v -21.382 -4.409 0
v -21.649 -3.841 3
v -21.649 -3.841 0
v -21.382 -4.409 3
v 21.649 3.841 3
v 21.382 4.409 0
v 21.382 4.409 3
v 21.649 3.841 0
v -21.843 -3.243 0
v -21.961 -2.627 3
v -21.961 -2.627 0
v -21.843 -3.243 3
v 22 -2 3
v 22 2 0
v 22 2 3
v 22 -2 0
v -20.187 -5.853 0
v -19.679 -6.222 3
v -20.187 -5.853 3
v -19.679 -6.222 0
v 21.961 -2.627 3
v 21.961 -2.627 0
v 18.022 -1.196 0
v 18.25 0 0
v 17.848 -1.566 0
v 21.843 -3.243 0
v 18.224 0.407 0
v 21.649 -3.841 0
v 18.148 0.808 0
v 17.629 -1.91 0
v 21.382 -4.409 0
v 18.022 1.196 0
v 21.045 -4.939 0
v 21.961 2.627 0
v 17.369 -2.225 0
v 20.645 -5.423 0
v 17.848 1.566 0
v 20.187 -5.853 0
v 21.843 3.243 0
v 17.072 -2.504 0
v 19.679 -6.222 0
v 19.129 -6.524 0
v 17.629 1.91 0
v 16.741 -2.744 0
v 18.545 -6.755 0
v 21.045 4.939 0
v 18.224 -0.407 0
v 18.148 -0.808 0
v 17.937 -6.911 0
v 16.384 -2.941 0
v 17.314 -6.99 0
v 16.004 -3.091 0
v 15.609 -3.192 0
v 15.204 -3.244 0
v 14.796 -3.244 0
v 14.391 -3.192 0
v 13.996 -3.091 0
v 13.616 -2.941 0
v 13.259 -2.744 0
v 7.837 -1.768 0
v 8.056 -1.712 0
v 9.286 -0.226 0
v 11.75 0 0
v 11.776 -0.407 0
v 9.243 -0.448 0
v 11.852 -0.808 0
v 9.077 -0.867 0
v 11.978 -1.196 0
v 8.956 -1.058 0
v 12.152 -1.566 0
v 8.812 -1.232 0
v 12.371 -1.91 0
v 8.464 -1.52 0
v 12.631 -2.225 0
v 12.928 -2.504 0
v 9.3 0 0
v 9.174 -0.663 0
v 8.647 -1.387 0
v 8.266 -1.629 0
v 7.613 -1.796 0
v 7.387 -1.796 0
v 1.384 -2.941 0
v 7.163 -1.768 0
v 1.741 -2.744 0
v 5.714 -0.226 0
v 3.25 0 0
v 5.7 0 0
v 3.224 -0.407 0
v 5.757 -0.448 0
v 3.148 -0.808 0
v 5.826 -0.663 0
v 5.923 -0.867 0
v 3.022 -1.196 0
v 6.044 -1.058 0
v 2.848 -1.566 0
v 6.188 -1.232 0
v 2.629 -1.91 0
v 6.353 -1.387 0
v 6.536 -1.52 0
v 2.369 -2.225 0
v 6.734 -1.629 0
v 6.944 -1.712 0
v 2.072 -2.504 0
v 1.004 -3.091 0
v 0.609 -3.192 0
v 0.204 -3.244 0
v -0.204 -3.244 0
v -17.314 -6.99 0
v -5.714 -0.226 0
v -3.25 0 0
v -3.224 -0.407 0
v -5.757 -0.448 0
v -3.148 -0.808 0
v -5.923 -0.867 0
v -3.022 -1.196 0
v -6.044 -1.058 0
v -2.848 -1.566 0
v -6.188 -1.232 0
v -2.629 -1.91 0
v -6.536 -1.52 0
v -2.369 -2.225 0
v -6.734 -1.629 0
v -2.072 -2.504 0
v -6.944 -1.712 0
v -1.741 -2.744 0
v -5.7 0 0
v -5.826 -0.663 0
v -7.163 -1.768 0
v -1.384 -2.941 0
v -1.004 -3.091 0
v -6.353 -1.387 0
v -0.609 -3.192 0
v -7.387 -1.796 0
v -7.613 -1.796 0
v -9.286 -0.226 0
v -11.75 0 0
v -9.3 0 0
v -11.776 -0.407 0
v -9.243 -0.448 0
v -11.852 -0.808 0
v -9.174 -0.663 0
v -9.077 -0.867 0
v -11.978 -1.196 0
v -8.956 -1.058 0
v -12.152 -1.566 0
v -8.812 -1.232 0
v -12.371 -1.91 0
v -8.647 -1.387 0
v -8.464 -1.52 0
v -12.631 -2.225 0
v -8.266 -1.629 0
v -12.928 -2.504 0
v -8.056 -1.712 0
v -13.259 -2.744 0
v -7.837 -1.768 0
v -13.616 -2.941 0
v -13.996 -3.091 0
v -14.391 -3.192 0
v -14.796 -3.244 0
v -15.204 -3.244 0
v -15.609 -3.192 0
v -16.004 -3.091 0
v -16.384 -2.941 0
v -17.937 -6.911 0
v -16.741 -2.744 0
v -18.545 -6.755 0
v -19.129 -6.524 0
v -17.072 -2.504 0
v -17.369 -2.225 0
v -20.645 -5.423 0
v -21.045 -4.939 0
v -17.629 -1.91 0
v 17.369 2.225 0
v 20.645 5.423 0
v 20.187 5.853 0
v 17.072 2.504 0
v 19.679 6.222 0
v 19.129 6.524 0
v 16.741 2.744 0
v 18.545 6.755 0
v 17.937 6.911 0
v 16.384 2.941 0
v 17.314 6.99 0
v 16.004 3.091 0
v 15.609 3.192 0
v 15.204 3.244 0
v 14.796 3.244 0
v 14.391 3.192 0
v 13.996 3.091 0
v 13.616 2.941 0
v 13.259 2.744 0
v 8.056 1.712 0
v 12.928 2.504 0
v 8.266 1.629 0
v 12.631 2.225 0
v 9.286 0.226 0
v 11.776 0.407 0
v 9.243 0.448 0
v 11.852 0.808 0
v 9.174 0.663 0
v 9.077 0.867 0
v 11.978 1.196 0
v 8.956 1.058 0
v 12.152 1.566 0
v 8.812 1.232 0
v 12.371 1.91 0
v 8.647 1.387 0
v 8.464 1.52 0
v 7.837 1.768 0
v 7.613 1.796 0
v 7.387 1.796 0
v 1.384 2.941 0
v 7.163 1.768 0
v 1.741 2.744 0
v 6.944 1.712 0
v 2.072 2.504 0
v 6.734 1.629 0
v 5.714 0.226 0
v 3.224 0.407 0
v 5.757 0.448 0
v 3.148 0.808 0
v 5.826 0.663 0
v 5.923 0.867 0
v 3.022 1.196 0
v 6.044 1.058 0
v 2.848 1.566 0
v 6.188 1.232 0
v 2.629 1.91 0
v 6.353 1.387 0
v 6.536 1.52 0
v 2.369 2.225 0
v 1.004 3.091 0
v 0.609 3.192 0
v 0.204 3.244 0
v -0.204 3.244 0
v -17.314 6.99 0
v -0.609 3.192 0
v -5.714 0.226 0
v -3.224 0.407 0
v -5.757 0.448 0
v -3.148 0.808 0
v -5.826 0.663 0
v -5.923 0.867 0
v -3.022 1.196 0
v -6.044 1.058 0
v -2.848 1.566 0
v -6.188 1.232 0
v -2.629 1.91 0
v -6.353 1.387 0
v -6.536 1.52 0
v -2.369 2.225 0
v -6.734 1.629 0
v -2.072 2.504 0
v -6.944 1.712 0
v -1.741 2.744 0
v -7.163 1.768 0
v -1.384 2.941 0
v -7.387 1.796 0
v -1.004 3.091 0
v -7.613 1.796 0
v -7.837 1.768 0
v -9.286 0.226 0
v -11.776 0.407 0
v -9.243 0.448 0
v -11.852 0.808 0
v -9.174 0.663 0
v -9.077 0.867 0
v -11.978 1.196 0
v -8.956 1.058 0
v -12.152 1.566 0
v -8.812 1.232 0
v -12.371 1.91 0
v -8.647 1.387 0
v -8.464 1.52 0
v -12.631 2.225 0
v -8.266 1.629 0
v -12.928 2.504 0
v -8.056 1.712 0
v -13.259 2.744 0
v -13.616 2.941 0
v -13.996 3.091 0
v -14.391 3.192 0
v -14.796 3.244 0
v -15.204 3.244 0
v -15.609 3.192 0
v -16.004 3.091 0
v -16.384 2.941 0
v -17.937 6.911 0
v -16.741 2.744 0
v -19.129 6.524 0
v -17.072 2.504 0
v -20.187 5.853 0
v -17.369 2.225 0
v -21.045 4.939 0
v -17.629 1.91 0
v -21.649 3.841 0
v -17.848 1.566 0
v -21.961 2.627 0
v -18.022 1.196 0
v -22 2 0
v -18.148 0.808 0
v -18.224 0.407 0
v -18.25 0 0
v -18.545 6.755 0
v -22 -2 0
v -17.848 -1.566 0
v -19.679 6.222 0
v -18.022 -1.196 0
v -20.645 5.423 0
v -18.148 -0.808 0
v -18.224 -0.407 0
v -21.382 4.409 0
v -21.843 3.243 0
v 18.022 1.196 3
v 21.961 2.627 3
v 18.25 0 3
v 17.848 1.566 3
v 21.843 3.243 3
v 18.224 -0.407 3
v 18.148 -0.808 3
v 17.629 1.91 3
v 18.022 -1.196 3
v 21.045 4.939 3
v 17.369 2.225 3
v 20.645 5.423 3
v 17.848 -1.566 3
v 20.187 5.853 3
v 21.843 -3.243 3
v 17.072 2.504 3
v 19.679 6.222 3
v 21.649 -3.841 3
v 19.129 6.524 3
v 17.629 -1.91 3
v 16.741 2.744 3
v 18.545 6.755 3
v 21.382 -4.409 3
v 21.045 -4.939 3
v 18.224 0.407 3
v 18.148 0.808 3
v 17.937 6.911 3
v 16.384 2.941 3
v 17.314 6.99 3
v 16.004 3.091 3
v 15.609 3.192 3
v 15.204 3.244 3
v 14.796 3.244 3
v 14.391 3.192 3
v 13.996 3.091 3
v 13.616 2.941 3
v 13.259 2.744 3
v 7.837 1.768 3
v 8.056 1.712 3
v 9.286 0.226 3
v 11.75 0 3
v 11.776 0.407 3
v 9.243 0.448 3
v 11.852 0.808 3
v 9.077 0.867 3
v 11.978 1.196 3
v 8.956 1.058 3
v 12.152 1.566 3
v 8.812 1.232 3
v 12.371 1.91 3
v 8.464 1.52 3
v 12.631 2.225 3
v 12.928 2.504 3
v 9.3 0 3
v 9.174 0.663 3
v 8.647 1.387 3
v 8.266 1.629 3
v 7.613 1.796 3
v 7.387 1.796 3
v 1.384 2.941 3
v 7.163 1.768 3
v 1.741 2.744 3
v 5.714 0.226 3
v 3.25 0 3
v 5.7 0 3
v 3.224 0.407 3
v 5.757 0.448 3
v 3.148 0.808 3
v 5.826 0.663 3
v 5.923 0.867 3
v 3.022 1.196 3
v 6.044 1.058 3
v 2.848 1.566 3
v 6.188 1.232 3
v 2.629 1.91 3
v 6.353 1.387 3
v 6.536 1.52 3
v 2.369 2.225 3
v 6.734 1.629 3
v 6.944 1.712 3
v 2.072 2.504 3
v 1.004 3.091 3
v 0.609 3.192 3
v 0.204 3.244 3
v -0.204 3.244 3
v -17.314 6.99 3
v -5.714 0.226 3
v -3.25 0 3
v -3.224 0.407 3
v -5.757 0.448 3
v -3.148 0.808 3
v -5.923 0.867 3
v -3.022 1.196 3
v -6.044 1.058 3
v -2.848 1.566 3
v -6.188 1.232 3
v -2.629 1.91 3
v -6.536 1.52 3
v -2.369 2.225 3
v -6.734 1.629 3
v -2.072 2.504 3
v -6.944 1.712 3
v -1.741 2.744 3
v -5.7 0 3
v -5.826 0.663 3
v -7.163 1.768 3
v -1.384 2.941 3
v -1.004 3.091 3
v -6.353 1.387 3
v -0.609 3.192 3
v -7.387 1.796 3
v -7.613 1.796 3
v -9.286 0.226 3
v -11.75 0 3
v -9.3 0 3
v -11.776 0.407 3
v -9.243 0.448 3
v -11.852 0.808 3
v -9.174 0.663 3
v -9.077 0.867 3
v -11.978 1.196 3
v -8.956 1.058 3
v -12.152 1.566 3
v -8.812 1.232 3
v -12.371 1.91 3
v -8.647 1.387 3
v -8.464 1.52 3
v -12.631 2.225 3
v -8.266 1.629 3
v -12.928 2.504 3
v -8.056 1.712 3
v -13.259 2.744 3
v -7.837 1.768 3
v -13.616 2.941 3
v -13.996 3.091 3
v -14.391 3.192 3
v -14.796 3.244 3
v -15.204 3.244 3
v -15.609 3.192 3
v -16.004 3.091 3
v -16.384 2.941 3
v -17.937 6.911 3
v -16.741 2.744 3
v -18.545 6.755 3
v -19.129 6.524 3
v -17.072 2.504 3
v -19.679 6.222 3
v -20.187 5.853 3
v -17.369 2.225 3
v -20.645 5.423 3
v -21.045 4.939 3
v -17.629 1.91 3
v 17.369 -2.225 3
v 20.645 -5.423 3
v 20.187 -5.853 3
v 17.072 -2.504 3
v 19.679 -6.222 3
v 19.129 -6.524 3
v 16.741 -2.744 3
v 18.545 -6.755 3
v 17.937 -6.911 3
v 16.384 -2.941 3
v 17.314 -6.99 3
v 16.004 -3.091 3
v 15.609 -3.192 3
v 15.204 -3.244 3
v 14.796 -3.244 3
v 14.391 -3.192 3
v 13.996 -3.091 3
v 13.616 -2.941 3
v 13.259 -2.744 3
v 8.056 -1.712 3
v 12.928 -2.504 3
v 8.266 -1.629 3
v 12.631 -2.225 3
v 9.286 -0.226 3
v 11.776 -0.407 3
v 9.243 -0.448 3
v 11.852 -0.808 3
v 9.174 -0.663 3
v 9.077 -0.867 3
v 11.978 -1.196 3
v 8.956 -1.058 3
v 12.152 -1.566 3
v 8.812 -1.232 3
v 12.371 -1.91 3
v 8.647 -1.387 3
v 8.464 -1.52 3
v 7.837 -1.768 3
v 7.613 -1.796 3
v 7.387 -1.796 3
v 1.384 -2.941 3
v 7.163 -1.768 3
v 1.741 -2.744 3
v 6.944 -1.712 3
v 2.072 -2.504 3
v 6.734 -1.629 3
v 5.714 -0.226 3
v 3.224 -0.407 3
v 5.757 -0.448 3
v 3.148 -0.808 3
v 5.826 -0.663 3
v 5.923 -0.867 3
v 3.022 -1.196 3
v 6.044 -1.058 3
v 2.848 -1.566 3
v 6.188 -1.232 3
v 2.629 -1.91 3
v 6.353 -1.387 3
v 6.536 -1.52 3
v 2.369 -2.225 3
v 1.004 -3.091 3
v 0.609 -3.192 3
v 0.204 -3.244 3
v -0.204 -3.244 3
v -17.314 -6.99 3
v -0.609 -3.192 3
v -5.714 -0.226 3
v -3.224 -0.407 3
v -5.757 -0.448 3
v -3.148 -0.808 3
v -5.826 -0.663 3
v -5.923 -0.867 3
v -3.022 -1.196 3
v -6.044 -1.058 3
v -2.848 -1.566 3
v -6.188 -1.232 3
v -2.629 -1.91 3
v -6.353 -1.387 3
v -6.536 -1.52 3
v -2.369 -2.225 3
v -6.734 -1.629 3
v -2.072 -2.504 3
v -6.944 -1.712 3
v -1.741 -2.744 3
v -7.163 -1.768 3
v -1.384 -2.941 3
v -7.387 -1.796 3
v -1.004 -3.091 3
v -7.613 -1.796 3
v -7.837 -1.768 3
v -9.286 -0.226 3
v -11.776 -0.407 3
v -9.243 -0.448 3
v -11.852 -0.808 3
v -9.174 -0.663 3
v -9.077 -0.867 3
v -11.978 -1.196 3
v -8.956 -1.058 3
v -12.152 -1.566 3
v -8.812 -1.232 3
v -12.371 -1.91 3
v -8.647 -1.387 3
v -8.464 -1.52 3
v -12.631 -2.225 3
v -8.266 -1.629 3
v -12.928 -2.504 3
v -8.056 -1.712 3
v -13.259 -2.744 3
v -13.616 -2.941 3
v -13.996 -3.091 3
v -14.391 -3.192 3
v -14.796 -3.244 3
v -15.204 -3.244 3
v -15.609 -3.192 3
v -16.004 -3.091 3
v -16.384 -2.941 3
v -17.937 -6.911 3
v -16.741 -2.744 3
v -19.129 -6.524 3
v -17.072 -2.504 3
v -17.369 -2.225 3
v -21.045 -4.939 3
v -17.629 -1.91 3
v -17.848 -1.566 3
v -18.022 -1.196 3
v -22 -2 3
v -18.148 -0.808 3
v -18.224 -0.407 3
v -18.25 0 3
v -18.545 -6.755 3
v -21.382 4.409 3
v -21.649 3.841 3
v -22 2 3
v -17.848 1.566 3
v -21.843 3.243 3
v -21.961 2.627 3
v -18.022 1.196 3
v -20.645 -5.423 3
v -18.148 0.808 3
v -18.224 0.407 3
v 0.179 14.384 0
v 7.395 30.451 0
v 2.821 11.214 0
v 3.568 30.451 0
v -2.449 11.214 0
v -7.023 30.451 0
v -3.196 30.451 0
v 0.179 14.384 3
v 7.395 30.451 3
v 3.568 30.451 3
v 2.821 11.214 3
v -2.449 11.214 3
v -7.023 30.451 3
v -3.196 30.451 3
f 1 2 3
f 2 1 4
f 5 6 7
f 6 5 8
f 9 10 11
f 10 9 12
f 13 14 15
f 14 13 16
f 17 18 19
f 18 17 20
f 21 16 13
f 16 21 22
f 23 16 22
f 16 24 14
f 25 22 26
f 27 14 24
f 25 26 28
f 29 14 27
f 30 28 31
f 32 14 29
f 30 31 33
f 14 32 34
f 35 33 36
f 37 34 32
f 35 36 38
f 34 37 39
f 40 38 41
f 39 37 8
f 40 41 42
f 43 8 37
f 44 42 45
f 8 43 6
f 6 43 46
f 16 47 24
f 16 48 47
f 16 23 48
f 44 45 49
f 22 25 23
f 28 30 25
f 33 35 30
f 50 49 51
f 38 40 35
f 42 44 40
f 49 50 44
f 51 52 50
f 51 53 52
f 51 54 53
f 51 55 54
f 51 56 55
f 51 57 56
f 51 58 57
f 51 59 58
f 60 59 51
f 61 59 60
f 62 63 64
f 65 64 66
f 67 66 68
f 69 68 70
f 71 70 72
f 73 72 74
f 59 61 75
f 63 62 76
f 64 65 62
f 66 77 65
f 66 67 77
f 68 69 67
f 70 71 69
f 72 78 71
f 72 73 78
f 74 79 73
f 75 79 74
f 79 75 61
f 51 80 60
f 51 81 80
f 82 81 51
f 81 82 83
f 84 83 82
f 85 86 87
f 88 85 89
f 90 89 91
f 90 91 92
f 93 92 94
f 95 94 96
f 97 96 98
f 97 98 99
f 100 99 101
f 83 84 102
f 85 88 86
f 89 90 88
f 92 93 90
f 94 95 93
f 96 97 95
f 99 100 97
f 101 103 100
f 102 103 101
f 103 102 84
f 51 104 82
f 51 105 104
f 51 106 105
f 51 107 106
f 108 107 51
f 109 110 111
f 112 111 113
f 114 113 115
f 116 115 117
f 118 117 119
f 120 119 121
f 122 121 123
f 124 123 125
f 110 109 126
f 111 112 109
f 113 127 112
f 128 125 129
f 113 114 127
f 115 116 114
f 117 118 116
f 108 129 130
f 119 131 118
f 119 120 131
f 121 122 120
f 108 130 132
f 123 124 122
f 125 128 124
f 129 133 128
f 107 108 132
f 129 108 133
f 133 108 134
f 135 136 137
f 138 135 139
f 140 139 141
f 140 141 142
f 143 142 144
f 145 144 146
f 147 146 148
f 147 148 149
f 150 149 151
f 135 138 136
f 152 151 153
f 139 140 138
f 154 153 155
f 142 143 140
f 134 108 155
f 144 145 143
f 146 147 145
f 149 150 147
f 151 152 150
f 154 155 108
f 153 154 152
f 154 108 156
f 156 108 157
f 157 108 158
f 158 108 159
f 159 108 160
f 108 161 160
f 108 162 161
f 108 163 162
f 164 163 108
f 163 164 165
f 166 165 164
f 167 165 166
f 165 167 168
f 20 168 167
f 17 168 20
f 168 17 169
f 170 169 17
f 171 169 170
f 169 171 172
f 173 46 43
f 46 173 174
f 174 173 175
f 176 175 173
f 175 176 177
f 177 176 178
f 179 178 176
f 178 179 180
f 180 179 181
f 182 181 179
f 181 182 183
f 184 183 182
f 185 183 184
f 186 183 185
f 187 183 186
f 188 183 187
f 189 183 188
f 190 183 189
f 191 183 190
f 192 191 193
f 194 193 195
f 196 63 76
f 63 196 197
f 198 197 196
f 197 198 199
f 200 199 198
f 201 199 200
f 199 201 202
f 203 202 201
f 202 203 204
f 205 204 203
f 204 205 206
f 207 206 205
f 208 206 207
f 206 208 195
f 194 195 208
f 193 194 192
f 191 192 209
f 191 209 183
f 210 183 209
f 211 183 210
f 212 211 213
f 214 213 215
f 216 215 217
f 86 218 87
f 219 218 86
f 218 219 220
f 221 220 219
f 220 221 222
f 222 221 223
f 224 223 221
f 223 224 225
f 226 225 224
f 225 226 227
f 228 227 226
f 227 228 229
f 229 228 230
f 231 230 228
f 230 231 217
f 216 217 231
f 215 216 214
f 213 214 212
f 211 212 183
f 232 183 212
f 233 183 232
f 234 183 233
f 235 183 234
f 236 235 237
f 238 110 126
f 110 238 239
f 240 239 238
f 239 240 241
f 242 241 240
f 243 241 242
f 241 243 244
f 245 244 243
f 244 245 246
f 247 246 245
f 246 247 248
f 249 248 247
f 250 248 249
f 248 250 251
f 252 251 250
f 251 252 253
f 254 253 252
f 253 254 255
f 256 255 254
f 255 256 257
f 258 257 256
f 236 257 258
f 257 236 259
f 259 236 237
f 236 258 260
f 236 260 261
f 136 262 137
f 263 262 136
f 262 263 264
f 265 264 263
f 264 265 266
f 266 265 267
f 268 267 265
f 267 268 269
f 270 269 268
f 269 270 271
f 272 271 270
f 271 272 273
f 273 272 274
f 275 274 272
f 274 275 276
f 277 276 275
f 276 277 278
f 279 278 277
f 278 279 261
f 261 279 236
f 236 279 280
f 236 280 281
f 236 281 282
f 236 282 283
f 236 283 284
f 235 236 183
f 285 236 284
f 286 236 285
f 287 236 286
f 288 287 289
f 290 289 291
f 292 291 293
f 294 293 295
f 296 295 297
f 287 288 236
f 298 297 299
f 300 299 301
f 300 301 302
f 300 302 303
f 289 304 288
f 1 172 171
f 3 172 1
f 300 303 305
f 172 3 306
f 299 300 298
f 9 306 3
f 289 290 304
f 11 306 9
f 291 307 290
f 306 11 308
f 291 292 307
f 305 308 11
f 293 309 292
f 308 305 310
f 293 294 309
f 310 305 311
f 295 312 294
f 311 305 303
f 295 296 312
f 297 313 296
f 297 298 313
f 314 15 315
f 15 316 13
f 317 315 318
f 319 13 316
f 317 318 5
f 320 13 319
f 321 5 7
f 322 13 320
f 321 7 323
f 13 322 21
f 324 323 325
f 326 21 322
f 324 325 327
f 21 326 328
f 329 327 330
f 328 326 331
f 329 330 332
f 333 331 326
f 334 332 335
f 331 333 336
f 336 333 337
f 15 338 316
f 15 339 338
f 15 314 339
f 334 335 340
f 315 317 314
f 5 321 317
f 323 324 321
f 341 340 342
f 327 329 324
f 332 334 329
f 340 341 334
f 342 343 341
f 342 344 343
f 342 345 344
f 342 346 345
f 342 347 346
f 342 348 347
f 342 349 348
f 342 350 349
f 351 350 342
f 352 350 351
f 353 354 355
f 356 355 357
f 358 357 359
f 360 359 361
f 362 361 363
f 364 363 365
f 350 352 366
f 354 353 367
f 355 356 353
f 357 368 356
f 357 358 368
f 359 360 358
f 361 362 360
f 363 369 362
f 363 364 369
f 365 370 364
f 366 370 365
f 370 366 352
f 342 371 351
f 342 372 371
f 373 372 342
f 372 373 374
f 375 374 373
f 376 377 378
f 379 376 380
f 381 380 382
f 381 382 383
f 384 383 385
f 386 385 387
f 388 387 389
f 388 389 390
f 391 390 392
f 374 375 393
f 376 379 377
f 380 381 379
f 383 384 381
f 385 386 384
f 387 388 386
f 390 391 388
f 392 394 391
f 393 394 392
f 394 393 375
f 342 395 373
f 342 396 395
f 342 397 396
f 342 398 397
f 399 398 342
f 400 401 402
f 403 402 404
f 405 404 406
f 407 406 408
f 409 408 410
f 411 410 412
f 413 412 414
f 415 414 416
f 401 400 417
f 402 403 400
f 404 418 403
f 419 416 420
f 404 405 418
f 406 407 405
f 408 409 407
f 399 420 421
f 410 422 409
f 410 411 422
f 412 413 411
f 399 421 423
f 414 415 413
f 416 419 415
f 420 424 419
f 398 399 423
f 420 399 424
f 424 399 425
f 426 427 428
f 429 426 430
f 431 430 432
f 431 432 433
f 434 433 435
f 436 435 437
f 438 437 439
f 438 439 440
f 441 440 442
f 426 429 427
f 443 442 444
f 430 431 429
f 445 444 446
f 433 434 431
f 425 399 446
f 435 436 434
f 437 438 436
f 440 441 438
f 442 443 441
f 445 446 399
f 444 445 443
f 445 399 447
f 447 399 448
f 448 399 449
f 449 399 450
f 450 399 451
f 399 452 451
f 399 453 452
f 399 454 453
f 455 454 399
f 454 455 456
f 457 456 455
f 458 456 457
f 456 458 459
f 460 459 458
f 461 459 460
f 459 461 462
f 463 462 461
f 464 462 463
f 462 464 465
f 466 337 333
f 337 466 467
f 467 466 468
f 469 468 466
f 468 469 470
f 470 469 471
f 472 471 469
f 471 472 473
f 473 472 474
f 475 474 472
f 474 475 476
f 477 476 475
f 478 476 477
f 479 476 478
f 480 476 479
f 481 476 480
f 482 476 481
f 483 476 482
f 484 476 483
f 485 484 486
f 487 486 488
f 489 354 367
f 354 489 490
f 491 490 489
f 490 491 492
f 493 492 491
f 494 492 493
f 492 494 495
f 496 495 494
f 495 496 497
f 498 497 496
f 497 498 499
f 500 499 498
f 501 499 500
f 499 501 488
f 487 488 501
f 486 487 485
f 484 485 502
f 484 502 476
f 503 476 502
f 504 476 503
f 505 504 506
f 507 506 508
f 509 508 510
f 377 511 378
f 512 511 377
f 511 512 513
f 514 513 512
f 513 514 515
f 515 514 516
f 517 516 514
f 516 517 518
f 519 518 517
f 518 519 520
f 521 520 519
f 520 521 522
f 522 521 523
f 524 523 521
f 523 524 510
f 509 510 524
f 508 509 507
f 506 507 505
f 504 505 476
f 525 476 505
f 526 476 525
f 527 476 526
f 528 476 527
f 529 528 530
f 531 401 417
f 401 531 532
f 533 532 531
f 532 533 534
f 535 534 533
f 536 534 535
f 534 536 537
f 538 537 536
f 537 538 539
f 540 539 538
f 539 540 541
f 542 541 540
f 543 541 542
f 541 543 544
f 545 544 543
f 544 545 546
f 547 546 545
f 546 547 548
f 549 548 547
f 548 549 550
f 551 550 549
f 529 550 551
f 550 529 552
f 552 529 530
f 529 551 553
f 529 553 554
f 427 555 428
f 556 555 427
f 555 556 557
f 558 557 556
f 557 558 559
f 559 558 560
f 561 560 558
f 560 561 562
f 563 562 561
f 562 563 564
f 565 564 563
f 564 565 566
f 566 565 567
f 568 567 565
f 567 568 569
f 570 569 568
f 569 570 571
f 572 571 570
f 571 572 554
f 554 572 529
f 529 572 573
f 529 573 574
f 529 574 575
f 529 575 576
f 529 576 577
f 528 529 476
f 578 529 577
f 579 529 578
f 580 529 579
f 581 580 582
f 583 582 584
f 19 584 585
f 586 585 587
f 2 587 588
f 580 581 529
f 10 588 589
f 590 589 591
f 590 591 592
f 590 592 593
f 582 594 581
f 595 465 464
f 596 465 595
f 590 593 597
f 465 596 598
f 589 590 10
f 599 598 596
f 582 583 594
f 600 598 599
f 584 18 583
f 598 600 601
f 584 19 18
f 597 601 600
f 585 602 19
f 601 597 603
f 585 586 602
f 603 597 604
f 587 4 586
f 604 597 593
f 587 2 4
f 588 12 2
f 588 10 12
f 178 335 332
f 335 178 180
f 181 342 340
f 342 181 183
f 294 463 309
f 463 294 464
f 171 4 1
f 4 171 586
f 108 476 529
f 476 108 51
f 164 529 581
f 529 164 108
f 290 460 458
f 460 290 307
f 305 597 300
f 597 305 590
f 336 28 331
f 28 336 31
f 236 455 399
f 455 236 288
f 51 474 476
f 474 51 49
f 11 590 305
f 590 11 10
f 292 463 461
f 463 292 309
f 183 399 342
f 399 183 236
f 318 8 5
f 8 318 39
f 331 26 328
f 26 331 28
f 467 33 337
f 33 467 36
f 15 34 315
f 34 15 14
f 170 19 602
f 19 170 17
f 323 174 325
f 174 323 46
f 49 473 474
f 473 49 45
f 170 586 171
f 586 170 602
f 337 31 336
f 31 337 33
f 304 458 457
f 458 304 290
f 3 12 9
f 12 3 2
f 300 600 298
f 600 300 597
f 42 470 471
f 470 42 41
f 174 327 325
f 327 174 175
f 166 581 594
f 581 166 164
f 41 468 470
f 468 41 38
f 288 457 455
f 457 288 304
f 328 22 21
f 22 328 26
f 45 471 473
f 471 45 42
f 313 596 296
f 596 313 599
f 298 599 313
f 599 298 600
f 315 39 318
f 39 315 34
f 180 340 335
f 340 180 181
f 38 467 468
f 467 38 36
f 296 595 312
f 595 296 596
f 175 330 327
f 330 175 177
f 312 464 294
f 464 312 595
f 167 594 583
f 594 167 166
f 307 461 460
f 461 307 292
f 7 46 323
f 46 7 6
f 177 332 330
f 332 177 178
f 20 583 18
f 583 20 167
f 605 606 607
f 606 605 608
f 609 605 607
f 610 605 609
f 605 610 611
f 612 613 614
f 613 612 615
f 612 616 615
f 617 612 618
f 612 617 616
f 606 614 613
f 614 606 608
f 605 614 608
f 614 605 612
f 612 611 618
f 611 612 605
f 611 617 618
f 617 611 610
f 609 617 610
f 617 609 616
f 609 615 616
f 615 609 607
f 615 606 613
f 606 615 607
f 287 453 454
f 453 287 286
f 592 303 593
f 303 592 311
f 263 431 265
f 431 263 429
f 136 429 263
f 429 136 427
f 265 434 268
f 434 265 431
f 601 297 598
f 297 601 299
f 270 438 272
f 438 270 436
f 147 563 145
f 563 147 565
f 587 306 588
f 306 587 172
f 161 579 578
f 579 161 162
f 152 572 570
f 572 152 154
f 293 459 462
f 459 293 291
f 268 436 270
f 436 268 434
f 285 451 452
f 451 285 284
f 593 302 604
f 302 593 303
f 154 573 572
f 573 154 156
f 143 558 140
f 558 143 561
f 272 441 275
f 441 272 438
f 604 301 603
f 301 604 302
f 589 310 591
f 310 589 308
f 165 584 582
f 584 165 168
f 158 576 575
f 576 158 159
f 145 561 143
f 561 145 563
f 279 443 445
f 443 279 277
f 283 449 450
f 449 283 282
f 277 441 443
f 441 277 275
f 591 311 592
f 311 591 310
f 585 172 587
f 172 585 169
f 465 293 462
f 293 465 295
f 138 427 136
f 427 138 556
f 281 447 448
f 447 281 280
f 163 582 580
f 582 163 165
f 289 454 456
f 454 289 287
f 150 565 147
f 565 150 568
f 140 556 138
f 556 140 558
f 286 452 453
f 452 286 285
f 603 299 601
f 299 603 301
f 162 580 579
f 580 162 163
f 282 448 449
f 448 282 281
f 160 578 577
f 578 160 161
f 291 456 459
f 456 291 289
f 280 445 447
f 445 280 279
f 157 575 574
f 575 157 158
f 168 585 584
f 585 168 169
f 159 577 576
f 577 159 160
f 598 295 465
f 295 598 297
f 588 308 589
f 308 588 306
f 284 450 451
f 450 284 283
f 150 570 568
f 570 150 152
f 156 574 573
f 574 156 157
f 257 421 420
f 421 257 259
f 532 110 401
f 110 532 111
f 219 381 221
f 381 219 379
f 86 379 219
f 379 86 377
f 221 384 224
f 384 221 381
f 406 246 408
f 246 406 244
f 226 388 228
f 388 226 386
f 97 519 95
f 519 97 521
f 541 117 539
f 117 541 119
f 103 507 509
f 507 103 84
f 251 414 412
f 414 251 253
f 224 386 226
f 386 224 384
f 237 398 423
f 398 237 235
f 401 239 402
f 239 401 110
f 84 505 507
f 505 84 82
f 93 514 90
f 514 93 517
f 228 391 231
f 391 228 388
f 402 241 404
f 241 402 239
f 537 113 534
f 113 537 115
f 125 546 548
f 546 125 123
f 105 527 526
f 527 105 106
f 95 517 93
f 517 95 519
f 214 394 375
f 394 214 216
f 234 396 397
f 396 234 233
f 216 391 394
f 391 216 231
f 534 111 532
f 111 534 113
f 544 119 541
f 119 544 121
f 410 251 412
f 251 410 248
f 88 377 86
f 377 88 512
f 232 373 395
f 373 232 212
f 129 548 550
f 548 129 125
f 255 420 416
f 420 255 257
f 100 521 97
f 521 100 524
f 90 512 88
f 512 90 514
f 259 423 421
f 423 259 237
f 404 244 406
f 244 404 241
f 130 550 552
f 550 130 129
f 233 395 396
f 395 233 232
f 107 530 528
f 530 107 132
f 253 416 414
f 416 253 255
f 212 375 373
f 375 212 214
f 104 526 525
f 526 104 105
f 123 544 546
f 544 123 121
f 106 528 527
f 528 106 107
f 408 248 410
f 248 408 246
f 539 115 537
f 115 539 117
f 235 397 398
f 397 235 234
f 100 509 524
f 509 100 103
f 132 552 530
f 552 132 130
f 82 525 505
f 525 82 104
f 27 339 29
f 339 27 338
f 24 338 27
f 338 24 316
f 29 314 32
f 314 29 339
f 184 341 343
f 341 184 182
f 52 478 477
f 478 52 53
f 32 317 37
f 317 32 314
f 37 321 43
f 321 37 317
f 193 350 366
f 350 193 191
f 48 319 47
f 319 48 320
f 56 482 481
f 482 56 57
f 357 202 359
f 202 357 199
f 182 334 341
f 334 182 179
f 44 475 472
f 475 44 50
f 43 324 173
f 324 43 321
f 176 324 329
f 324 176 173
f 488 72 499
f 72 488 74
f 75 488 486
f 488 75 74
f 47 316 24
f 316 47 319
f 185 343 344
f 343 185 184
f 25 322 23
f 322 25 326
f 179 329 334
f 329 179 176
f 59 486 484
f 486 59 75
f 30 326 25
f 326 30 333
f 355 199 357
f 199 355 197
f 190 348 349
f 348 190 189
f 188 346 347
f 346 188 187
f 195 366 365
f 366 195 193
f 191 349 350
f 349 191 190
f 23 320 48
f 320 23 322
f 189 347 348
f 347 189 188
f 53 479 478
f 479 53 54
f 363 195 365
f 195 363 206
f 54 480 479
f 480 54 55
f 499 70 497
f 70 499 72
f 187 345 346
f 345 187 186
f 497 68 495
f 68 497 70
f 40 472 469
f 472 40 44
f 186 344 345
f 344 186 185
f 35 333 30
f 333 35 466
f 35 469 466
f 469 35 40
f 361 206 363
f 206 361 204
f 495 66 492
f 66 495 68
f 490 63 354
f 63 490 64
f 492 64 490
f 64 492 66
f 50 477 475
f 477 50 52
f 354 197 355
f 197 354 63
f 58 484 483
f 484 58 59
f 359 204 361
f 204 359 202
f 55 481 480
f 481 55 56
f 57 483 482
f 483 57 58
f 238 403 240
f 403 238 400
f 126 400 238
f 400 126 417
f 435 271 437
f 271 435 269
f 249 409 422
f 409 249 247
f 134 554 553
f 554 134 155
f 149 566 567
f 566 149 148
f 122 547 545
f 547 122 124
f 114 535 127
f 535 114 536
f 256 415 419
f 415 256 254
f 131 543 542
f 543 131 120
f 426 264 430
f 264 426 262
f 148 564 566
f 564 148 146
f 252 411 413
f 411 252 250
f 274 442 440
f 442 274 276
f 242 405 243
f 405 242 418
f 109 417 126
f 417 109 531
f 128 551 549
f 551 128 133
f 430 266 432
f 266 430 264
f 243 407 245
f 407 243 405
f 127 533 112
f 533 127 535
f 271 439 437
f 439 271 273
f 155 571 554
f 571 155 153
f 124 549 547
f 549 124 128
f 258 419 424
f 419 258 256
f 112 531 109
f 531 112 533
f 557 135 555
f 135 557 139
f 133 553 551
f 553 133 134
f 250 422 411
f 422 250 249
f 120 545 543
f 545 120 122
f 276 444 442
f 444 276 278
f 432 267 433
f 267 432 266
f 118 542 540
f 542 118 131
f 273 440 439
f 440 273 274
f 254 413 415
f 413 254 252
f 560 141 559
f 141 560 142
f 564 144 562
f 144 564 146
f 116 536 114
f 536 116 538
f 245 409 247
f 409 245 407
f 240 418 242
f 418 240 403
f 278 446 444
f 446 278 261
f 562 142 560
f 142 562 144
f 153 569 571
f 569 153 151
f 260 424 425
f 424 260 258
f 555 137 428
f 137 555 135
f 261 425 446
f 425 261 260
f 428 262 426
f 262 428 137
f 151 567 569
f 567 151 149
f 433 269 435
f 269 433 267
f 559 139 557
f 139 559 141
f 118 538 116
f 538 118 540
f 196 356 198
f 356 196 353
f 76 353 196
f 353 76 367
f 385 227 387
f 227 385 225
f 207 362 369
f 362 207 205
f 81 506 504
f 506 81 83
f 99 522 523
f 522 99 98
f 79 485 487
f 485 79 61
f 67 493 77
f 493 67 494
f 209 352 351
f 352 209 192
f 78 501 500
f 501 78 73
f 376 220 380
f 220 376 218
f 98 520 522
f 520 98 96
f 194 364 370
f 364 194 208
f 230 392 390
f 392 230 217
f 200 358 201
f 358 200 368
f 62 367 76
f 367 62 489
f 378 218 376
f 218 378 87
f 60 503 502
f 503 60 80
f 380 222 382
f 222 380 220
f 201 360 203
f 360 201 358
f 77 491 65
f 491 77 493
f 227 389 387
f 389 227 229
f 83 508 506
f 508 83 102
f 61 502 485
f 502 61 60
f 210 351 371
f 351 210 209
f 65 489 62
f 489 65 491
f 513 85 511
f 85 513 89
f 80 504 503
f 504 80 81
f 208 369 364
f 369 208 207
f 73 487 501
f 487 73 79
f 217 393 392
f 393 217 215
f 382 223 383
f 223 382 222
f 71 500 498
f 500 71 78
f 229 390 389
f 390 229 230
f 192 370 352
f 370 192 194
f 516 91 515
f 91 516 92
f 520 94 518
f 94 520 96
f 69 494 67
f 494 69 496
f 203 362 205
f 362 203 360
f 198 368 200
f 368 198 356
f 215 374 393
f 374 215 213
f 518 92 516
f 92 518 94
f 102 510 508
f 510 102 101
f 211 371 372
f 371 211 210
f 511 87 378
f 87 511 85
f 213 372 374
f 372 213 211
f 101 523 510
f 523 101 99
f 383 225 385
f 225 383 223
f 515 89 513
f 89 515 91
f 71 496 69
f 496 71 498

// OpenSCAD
$fn = 50;


difference() {
	union() {
		hull() {
			translate(v = [-17.0000000000, 2.0000000000, 0]) {
				cylinder(h = 3, r = 5);
			}
			translate(v = [17.0000000000, 2.0000000000, 0]) {
				cylinder(h = 3, r = 5);
			}
			translate(v = [-17.0000000000, -2.0000000000, 0]) {
				cylinder(h = 3, r = 5);
			}
			translate(v = [17.0000000000, -2.0000000000, 0]) {
				cylinder(h = 3, r = 5);
			}
		}
		translate(v = [0, 30.0000000000, 0]) {
			linear_extrude(height = 3) {
				text(font = "DejaVu Sans Mono:style=Bold", halign = "center", size = 19.0000000000, text = "V", valign = "top");
			}
		}
	}
	union() {
		translate(v = [-15.0000000000, 0.0000000000, 0]) {
			translate(v = [0, 0, -100]) {
				cylinder(h = 200, r = 3.2500000000);
			}
		}
		translate(v = [0, 0, -100]) {
			cylinder(h = 200, r = 3.2500000000);
		}
		translate(v = [15.0000000000, 0.0000000000, 0]) {
			translate(v = [0, 0, -100]) {
				cylinder(h = 200, r = 3.2500000000);
			}
		}
		translate(v = [-15.0000000000, 0.0000000000, 0]) {
			translate(v = [0, 0, -100]) {
				cylinder(h = 200, r = 1.8000000000);
			}
		}
		translate(v = [-7.5000000000, 0.0000000000, 0]) {
			translate(v = [0, 0, -100]) {
				cylinder(h = 200, r = 1.8000000000);
			}
		}
		translate(v = [0, 0, -100]) {
			cylinder(h = 200, r = 1.8000000000);
		}
		translate(v = [7.5000000000, 0.0000000000, 0]) {
			translate(v = [0, 0, -100]) {
				cylinder(h = 200, r = 1.8000000000);
			}
		}
		translate(v = [15.0000000000, 0.0000000000, 0]) {
			translate(v = [0, 0, -100]) {
				cylinder(h = 200, r = 1.8000000000);
			}
		}
	}
}
